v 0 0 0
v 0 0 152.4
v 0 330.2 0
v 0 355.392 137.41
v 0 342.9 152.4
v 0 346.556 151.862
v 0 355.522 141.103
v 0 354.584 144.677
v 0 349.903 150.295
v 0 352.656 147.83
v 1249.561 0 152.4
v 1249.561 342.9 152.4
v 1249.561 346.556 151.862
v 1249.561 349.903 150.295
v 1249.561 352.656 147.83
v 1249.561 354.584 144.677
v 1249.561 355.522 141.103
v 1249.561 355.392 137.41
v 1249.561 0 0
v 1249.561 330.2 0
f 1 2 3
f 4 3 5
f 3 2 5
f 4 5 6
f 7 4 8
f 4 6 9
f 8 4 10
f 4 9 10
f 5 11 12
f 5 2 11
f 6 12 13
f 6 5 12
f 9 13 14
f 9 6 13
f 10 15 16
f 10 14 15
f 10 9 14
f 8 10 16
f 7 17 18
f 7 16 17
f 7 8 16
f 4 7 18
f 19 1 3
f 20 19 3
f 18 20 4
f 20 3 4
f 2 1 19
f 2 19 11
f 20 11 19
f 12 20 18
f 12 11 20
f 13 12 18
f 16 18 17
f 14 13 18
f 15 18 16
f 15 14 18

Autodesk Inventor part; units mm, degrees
ref_plane "YZ Plane" through (0, 0, 0) normal (1, 0, 0) x (0, 1, 0)
ref_plane "XZ Plane" through (0, 0, 0) normal (0, 1, 0) x (-1, 0, 0)
ref_plane "XY Plane" through (0, 0, 0) normal (0, 0, 1) x (1, 0, 0)
sketch "Sketch1" plane through (0, 0, 0) normal (1, 0, 0) x (0, 1, 0)
  line L0 (0, 0) -> (0, 152.4)
  line L1 (0, 0) -> (330.2, 0)
  line L2 (0, 152.4) -> (342.9, 152.4)
  line L3 (342.9, 152.4) -> (342.9, 139.7) construction
  arc A0 (355.3918, 137.4098) -> (342.9, 152.4) centre (342.9, 139.7) ccw
  line L4 (330.2, 0) -> (355.7981, 139.6261)
  dimension "d0" = 152.4
  dimension "d1" = 330.2
  dimension "d2" = 342.9
  dimension "d3" = 12.7
extrude "Extrusion1" add sketch "Sketch1" along normal blind 1249.5609
properties part number "D" material "Granite, Cut, Polished"
